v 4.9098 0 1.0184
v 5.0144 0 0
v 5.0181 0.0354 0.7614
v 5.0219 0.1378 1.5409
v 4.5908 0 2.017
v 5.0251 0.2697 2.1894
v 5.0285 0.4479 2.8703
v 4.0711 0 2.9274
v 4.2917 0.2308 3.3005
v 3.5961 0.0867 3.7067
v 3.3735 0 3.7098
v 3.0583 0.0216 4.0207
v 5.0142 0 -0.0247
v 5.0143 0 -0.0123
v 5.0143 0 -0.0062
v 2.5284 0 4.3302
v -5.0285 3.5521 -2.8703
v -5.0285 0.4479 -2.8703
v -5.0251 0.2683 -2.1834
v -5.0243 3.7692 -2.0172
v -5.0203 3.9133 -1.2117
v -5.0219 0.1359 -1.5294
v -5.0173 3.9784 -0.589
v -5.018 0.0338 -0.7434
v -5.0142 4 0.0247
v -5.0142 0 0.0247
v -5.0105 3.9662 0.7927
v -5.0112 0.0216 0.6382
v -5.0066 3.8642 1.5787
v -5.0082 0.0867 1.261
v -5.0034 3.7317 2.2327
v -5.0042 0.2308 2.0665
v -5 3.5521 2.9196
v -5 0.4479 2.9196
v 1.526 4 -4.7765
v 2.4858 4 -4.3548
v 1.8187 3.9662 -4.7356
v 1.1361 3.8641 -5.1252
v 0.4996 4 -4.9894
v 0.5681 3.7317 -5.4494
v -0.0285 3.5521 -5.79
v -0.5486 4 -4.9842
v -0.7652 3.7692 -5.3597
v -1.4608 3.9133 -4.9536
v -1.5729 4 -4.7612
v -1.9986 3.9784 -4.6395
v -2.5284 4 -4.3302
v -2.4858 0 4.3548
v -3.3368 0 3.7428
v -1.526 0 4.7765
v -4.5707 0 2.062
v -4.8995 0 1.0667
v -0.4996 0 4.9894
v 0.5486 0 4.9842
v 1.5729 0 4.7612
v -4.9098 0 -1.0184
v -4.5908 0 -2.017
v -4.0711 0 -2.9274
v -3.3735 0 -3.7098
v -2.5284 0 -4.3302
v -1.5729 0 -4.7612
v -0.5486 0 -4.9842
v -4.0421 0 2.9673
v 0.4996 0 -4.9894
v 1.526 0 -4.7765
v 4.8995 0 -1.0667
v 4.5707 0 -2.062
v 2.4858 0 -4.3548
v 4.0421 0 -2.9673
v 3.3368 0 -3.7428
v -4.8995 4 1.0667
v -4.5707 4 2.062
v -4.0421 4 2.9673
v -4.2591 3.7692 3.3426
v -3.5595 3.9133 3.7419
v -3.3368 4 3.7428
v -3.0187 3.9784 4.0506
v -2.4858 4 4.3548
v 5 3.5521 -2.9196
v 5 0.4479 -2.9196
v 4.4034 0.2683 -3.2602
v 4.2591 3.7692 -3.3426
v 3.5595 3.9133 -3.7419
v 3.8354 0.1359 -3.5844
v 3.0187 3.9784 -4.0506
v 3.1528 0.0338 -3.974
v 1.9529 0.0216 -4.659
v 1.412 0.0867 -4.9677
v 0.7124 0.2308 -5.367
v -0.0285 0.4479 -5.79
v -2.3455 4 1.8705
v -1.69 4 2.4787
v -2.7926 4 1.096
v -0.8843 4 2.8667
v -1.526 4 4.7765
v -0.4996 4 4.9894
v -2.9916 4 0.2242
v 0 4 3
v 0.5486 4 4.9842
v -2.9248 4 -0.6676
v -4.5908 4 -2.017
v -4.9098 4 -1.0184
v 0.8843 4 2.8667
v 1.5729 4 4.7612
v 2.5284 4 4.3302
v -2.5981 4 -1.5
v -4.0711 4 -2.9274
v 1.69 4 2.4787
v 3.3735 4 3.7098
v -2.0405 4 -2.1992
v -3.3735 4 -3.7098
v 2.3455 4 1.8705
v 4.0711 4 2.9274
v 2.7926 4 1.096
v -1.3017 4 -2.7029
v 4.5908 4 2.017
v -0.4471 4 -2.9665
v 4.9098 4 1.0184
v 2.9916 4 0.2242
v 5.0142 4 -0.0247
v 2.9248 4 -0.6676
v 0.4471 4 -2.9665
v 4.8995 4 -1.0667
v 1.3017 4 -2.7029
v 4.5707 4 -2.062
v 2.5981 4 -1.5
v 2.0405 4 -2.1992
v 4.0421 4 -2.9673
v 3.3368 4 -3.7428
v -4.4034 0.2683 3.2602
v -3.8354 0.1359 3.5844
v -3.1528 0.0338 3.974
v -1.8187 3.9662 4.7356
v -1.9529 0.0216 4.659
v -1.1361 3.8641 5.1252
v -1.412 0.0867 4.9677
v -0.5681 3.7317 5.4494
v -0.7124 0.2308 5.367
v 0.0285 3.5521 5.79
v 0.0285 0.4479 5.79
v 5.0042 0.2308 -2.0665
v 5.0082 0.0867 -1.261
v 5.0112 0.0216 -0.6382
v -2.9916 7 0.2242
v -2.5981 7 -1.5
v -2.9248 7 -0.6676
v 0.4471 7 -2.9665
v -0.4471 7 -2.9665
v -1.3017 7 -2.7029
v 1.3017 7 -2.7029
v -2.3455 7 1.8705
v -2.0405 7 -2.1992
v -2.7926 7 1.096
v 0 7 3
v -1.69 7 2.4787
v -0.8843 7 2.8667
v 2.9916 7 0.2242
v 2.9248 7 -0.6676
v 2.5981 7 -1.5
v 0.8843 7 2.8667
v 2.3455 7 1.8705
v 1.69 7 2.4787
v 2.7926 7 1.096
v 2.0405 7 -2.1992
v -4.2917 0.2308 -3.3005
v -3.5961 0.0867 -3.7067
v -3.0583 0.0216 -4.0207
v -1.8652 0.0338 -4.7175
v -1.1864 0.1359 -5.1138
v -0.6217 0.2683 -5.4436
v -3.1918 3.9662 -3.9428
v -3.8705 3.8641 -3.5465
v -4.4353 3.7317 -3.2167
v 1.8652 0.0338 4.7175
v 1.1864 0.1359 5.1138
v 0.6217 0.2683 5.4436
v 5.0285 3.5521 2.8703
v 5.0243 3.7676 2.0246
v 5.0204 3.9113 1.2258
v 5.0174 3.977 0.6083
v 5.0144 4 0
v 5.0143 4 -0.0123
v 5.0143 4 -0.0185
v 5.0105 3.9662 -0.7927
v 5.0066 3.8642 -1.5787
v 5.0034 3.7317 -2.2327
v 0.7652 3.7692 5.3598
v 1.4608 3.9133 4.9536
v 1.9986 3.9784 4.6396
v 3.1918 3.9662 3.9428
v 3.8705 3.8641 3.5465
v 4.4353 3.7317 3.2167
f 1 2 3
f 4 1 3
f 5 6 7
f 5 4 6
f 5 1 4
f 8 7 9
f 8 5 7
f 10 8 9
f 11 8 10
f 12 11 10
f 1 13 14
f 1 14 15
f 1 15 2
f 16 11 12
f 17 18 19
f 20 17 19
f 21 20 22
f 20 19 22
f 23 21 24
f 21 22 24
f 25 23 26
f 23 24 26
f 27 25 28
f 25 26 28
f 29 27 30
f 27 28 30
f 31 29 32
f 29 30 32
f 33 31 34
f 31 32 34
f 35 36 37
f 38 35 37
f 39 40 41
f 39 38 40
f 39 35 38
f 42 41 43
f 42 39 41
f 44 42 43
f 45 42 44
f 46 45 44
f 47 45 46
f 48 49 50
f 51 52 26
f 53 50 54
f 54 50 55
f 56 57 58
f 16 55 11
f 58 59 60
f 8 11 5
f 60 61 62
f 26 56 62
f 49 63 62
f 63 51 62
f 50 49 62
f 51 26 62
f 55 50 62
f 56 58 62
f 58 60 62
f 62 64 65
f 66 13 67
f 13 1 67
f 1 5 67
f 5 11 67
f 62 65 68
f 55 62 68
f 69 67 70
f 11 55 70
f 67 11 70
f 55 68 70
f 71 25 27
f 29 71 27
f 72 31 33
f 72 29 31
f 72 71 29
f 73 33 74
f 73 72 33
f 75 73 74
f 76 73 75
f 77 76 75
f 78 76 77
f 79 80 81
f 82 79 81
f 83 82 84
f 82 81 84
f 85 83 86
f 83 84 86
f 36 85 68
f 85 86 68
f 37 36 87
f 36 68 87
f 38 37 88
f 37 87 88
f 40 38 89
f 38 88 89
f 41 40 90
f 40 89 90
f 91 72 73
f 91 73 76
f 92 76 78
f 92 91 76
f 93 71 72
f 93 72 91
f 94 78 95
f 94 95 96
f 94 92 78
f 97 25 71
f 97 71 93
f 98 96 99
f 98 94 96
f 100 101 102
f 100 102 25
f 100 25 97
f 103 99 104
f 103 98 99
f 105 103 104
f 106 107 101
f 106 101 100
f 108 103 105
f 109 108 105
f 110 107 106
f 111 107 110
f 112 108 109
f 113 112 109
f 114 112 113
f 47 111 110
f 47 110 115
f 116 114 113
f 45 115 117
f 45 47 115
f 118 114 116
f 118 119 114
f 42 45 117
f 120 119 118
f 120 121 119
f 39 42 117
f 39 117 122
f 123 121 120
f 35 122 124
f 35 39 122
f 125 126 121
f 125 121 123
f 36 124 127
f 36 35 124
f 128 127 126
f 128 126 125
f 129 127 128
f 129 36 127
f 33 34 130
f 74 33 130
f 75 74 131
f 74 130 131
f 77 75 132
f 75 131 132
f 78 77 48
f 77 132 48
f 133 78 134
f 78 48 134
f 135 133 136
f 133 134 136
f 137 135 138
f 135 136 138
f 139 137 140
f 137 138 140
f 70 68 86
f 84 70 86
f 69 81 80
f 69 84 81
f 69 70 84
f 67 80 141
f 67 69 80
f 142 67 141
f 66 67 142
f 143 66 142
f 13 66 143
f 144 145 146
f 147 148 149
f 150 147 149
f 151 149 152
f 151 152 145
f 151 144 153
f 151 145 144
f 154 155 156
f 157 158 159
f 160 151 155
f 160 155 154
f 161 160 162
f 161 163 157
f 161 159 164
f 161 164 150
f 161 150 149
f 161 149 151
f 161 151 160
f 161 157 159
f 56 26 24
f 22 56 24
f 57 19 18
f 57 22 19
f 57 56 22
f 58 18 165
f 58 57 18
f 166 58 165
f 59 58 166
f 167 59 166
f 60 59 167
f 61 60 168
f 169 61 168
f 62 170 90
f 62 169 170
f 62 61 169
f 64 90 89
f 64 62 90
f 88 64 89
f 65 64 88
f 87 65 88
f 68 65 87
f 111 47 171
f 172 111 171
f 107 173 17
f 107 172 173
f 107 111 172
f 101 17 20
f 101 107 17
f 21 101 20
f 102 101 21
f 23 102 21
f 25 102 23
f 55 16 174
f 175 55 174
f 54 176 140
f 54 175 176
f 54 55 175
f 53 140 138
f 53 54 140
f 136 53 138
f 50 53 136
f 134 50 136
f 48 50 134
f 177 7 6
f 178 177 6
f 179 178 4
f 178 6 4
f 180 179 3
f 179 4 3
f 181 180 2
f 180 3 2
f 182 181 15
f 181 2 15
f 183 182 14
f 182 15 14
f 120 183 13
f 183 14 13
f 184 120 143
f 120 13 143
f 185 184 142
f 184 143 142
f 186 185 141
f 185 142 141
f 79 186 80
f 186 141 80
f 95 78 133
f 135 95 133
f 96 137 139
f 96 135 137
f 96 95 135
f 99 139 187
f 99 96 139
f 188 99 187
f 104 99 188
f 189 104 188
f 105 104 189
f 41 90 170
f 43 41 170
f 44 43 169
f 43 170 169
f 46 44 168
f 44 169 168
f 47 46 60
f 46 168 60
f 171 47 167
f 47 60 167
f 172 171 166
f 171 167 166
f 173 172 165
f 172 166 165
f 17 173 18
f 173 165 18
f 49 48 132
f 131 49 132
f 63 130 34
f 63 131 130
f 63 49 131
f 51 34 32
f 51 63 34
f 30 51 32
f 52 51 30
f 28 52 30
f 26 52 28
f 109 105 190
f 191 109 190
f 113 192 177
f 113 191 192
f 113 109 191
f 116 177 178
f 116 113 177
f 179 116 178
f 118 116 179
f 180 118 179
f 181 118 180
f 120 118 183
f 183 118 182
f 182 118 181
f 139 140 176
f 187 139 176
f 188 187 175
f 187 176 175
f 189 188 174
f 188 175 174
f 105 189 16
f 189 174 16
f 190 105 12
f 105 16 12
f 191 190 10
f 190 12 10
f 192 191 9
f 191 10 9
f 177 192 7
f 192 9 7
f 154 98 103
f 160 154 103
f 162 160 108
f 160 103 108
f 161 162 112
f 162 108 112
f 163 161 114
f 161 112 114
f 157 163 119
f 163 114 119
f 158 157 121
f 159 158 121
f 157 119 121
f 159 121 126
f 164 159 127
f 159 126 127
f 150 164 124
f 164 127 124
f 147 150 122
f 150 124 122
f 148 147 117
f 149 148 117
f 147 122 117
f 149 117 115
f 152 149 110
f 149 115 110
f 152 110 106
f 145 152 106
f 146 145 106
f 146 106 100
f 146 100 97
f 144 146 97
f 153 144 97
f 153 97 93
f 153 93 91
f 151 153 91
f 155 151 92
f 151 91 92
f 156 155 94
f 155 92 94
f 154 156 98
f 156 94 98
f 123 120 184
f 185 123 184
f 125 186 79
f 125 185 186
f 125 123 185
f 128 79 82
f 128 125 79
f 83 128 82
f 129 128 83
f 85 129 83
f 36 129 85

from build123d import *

# Parameters (mm, degrees)
BOSS_EXTRUDE1_DEPTH = 4
SKETCH2_OUTSIDE_W   = 29.082
SKETCH2_OUTSIDE_H   = 30.606
SKETCH2_OUTSIDE_R   = 5.014305997
CUT_EXTRUDE1_DEPTH  = 4
CUT_EXTRUDE1_DRAFT  = -60
SKETCH3_OUTSIDE_W   = 29.082
SKETCH3_OUTSIDE_H   = 30.606
SKETCH3_OUTSIDE_R   = 5.014305997
CUT_EXTRUDE2_DEPTH  = 4
CUT_EXTRUDE2_DRAFT  = -60
SKETCH4_R           = 3
BOSS_EXTRUDE3_DEPTH = 3


with BuildPart() as part:
    # Sketch1 → Boss-Extrude1 (new body)
    with BuildSketch(Plane(origin=(0, 0, 0), x_dir=(1, 0, 0), z_dir=(0, 1, 0))):
        Polygon((5, 2.919649438), (-0.028490583, 5.789951738), (-5.028490583, 2.8703023), (-5, -2.919649438), (0.028490583, -5.789951738), (5.028490583, -2.8703023), align=None)
    extrude(amount=BOSS_EXTRUDE1_DEPTH)


with BuildPart() as cut_extrude1_tool:
    # Sketch2 outside → Cut-Extrude1 (with draft: the straight prism first)
    with BuildSketch(Plane(origin=(0, 4, 0), x_dir=(1, 0, 0), z_dir=(0, 1, 0))):
        Rectangle(SKETCH2_OUTSIDE_W, SKETCH2_OUTSIDE_H)
        Circle(SKETCH2_OUTSIDE_R, mode=Mode.SUBTRACT)
    extrude(amount=-CUT_EXTRUDE1_DEPTH)
    # Cut-Extrude1: the draft: its side faces are tilted about the plane it starts from
    cut_extrude1_sides = [cut_extrude1_tool.faces().sort_by_distance(p)[0] for p in [
        (0, 2, 15.303),
        (14.541, 2, 0),
        (0, 2, -15.303),
        (-14.541, 2, 0),
        (-5.014305997, 2, 0),
    ]]
    draft(cut_extrude1_sides, Plane(origin=(0, 4, 0), x_dir=(1, 0, 0), z_dir=(0, 1, 0)), CUT_EXTRUDE1_DRAFT)


with BuildPart() as part_1:
    add(part.part)

    # Cut-Extrude1: cut by cut_extrude1_tool
    add(cut_extrude1_tool.part, mode=Mode.SUBTRACT)


with BuildPart() as cut_extrude2_tool:
    # Sketch3 outside → Cut-Extrude2 (with draft: the straight prism first)
    with BuildSketch(Plane.XZ):
        Rectangle(SKETCH3_OUTSIDE_W, SKETCH3_OUTSIDE_H)
        Circle(SKETCH3_OUTSIDE_R, mode=Mode.SUBTRACT)
    extrude(amount=-CUT_EXTRUDE2_DEPTH)
    # Cut-Extrude2: the draft: its side faces are tilted about the plane it starts from
    cut_extrude2_sides = [cut_extrude2_tool.faces().sort_by_distance(p)[0] for p in [
        (0, 2, -15.303),
        (14.541, 2, 0),
        (0, 2, 15.303),
        (-14.541, 2, 0),
        (-5.014305997, 2, 0),
    ]]
    draft(cut_extrude2_sides, Plane.XZ, CUT_EXTRUDE2_DRAFT)


with BuildPart() as part_2:
    add(part_1.part)

    # Cut-Extrude2: cut by cut_extrude2_tool
    add(cut_extrude2_tool.part, mode=Mode.SUBTRACT)

    # Sketch4 → Boss-Extrude3 (add)
    with BuildSketch(Plane(origin=(0, 4, 0), x_dir=(1, 0, 0), z_dir=(0, 1, 0))):
        with Locations(Location((0, 0, 0), (0, 0, 270))):
            Circle(SKETCH4_R)
    extrude(amount=BOSS_EXTRUDE3_DEPTH)


solid = part_2.part
